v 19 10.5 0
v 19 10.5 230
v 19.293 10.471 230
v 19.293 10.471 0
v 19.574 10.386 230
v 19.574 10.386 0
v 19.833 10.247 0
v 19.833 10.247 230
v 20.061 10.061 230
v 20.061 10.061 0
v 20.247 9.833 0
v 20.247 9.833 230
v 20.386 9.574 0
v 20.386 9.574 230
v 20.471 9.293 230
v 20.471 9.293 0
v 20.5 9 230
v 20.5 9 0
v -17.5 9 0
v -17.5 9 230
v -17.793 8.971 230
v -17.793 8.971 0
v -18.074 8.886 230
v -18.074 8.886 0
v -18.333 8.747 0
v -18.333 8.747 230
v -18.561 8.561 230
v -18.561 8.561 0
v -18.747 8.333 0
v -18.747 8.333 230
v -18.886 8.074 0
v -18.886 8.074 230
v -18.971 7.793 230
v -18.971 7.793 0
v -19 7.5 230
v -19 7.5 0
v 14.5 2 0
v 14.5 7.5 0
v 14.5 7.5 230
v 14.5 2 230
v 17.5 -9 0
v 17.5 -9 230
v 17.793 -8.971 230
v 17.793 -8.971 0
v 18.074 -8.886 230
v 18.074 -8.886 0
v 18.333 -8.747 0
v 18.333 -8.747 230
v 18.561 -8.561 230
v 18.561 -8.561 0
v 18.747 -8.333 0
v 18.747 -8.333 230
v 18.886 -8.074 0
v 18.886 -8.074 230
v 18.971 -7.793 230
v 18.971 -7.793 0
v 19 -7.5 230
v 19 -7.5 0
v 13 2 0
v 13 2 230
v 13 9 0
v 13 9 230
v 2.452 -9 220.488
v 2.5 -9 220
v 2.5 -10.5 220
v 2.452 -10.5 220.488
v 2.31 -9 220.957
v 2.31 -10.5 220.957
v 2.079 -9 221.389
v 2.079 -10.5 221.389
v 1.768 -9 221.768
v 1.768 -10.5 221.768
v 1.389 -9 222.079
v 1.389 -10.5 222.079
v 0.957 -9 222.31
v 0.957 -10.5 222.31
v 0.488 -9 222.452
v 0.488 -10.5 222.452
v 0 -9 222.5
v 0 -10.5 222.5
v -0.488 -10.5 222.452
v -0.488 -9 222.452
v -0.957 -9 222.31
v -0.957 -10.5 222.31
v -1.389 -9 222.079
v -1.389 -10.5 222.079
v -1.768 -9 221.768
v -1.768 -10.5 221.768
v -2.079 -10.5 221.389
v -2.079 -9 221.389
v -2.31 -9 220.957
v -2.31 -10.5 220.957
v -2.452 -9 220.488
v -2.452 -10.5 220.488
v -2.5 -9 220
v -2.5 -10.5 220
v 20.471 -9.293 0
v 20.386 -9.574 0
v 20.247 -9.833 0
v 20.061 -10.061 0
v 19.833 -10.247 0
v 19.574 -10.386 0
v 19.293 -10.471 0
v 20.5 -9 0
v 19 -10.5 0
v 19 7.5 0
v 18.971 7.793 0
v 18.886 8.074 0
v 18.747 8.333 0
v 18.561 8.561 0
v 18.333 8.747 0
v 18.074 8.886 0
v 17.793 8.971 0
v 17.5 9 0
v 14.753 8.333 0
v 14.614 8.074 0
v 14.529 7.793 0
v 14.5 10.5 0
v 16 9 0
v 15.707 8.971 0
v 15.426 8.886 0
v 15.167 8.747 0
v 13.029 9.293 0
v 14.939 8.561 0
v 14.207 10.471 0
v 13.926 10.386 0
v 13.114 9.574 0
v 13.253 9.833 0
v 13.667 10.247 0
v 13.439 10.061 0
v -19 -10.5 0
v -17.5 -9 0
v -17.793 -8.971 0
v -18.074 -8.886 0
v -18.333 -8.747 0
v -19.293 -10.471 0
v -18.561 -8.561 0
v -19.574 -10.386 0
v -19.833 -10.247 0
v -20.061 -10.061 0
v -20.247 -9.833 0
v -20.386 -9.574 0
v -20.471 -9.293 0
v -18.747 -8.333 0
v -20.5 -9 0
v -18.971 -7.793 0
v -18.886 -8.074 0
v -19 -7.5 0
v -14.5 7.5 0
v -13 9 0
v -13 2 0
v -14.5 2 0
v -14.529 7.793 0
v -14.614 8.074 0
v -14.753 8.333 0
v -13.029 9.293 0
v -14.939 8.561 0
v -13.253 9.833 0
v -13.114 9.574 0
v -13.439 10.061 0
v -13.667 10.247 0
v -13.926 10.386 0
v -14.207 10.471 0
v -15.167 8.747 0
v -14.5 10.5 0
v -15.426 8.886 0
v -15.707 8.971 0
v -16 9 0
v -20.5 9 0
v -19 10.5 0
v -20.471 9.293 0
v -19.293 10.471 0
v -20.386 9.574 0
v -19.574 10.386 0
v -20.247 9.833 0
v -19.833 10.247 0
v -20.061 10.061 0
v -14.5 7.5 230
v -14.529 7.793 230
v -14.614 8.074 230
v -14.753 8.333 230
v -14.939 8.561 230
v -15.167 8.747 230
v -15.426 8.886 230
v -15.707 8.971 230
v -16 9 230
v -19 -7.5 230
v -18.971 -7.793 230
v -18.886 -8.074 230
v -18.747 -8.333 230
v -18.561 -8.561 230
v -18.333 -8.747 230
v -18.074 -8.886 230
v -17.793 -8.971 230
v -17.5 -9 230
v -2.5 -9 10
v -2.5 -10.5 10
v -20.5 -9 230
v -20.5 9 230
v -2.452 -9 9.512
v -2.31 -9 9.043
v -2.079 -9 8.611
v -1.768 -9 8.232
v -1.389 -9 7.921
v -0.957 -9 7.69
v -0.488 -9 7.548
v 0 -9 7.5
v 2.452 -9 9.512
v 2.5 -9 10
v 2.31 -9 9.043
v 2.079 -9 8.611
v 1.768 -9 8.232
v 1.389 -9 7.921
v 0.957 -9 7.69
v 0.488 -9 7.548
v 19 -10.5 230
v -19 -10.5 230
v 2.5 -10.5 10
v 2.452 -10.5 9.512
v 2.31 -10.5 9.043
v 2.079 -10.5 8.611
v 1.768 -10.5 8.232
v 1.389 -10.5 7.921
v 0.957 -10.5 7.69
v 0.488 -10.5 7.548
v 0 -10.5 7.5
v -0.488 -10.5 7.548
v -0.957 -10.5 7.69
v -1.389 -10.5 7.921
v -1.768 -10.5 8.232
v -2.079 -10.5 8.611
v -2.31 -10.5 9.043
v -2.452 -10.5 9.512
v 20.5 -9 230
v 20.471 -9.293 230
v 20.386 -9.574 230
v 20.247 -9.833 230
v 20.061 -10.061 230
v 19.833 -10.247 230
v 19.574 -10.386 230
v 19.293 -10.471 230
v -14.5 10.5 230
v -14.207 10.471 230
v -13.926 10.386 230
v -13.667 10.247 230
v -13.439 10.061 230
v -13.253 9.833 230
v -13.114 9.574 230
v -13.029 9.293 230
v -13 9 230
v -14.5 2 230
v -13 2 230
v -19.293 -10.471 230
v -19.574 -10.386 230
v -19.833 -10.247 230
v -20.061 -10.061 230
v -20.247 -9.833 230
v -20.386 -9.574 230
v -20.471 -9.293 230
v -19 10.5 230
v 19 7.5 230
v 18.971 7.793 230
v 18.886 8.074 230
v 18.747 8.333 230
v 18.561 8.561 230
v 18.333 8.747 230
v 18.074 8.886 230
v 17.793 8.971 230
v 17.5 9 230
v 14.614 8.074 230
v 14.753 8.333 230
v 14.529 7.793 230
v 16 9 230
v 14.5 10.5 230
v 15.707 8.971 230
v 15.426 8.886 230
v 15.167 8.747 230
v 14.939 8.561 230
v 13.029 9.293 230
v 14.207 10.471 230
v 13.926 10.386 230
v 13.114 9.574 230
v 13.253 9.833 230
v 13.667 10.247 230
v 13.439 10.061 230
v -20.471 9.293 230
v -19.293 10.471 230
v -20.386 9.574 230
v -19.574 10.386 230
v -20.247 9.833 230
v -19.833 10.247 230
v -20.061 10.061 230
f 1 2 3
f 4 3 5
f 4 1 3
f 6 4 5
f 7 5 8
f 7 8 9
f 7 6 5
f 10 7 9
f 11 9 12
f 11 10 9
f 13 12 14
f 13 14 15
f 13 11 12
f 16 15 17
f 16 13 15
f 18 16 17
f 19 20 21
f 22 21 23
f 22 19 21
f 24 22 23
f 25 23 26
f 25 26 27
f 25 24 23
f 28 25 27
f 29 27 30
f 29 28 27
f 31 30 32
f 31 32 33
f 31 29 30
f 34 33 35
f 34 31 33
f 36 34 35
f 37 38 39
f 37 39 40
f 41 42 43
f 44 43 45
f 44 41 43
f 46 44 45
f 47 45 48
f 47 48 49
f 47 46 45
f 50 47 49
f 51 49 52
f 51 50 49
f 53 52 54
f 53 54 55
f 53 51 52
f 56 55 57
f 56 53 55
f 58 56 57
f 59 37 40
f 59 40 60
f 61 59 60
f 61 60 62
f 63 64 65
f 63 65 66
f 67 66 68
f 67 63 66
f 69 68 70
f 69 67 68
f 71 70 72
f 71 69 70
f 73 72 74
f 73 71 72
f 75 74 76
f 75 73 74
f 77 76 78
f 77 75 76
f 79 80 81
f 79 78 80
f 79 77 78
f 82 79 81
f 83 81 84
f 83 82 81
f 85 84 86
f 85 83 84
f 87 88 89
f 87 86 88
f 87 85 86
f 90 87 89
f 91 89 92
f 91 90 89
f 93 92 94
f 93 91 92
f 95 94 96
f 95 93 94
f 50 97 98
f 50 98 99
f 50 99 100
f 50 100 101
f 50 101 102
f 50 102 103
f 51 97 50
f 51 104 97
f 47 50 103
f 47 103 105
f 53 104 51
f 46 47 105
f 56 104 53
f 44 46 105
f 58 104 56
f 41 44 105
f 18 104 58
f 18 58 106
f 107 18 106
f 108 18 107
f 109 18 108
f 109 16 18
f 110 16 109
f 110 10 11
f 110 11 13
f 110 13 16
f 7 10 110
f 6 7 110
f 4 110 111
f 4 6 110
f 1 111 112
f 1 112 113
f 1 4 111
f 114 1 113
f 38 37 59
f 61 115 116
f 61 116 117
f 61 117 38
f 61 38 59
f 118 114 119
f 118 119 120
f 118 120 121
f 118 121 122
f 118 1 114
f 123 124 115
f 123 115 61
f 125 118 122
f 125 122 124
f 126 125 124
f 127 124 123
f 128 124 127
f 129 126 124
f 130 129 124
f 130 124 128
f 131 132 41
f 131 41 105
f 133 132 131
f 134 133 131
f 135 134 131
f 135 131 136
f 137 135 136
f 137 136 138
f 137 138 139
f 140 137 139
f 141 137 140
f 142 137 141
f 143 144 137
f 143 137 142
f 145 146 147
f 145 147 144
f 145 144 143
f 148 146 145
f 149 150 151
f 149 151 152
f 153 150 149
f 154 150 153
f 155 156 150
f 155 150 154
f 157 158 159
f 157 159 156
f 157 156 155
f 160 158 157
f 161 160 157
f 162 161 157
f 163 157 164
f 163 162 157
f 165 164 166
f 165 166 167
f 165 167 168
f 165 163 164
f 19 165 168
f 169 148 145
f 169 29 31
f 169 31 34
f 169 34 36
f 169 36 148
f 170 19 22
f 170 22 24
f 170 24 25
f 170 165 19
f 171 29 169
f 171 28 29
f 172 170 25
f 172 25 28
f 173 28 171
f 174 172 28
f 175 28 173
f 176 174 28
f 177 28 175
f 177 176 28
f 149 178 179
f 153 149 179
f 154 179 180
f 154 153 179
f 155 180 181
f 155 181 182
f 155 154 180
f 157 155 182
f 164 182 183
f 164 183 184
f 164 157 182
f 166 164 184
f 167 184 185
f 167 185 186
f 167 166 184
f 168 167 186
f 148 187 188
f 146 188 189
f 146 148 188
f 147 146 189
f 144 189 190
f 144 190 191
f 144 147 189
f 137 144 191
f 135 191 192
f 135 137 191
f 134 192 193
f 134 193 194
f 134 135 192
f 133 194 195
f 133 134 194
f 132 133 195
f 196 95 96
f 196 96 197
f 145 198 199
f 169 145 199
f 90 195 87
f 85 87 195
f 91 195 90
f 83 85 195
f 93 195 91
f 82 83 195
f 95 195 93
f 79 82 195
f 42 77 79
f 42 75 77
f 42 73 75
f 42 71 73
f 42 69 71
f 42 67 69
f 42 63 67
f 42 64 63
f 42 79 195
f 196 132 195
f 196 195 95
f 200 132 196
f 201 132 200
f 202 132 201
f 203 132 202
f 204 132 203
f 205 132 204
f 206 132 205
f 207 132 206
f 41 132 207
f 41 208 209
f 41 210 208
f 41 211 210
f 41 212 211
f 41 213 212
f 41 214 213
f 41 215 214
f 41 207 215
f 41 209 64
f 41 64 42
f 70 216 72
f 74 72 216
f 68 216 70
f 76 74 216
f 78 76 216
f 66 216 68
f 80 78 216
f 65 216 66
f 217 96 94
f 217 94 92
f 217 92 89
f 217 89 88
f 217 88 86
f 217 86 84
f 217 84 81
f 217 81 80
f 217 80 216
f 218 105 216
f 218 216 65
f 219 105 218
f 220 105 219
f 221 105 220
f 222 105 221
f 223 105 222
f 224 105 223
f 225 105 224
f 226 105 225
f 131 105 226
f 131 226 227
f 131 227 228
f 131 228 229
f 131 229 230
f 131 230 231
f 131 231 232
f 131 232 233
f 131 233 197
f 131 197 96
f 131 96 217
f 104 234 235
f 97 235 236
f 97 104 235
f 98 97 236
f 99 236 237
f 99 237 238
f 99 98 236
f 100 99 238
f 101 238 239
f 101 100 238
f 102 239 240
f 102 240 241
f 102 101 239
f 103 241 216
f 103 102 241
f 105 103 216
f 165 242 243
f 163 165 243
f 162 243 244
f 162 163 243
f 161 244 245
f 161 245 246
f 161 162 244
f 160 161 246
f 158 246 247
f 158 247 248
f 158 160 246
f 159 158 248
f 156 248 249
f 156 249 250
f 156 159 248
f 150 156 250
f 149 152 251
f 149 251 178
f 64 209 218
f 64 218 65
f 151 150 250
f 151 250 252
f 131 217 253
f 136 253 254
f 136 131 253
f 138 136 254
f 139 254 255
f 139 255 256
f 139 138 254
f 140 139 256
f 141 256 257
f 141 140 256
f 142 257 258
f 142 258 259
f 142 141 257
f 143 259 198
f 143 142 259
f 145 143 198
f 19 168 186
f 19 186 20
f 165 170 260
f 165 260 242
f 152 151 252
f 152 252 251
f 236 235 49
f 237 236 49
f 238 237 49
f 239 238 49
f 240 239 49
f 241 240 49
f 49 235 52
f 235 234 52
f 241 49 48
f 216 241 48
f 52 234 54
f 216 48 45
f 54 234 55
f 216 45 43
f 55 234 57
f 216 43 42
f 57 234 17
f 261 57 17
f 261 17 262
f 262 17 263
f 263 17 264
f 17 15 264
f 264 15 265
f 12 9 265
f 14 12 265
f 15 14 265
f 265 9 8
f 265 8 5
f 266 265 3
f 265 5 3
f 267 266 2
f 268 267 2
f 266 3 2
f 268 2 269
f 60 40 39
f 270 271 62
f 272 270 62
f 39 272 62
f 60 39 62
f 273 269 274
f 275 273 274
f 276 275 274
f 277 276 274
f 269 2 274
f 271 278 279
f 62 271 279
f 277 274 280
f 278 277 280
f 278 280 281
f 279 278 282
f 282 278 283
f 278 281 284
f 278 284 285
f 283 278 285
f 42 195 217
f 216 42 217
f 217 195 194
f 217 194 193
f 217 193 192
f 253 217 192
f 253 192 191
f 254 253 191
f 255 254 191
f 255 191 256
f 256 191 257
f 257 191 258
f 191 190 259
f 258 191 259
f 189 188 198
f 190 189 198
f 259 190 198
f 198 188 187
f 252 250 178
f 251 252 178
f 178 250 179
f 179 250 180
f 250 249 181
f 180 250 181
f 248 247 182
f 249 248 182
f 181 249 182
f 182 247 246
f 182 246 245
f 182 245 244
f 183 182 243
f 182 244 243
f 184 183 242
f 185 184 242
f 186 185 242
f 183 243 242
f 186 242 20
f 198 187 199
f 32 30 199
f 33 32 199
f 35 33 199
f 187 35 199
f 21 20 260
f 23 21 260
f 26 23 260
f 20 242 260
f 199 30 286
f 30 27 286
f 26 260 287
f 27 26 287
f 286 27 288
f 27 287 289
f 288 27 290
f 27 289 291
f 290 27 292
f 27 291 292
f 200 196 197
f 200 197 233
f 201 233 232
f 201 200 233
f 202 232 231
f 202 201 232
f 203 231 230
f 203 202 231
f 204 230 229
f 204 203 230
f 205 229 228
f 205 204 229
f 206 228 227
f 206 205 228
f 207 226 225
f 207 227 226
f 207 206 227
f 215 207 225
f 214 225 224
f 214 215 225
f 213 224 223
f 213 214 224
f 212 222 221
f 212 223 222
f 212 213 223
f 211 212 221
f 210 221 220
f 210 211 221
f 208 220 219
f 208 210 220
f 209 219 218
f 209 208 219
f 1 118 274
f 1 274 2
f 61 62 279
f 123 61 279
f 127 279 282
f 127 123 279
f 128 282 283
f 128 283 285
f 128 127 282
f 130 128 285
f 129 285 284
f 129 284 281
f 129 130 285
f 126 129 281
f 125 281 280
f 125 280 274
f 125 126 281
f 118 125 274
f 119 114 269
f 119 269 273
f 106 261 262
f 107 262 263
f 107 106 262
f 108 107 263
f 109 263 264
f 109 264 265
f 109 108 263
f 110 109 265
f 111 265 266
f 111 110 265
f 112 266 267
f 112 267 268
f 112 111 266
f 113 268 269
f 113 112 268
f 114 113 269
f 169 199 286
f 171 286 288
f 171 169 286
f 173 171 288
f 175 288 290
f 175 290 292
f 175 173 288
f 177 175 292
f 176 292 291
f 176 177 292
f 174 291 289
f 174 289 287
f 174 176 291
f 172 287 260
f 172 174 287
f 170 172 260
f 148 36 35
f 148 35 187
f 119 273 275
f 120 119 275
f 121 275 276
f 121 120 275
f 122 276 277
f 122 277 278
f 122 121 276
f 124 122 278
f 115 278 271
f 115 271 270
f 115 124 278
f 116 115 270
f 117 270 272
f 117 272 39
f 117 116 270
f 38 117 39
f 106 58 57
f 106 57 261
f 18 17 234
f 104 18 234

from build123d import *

# Parameters (mm, degrees)
EXTRUDE_1_DEPTH     = 230
CUT_EXTRUDE_1_DEPTH = 100


with BuildPart() as part:
    # 草图1 → 凸台-拉伸1 (new body)
    with BuildSketch(Plane.XY):
        with BuildLine():
            Line((-19, 10.5), (-14.5, 10.5))
            ThreePointArc((-14.5, 10.5), (-13.439339828, 10.060660172), (-13, 9))
            Line((-13, 9), (-13, 2))
            Line((-13, 2), (-14.5, 2))
            Line((-14.5, 2), (-14.5, 7.5))
            ThreePointArc((-14.5, 7.5), (-14.939339828, 8.560660172), (-16, 9))
            Line((-16, 9), (-17.5, 9))
            ThreePointArc((-17.5, 9), (-18.560660172, 8.560660172), (-19, 7.5))
            Line((-19, 7.5), (-19, -7.5))
            ThreePointArc((-19, -7.5), (-18.560660172, -8.560660172), (-17.5, -9))
            Line((-17.5, -9), (17.5, -9))
            ThreePointArc((17.5, -9), (18.560660172, -8.560660172), (19, -7.5))
            Line((19, -7.5), (19, 7.5))
            ThreePointArc((19, 7.5), (18.560660172, 8.560660172), (17.5, 9))
            Line((17.5, 9), (16, 9))
            ThreePointArc((16, 9), (14.939339828, 8.560660172), (14.5, 7.5))
            Line((14.5, 7.5), (14.5, 2))
            Line((14.5, 2), (13, 2))
            Line((13, 2), (13, 9))
            ThreePointArc((13, 9), (13.439339828, 10.060660172), (14.5, 10.5))
            Line((14.5, 10.5), (19, 10.5))
            ThreePointArc((19, 10.5), (20.060660172, 10.060660172), (20.5, 9))
            Line((20.5, 9), (20.5, -9))
            ThreePointArc((20.5, -9), (20.060660172, -10.060660172), (19, -10.5))
            Line((19, -10.5), (-19, -10.5))
            ThreePointArc((-19, -10.5), (-20.060660172, -10.060660172), (-20.5, -9))
            Line((-20.5, -9), (-20.5, 9))
            ThreePointArc((-20.5, 9), (-20.060660172, 10.060660172), (-19, 10.5))
        make_face()
    extrude(amount=EXTRUDE_1_DEPTH)

    # 草图3 → 切除-拉伸1 (cut)
    with BuildSketch(Plane(origin=(0, 0, 0), x_dir=(1, 0, 0), z_dir=(0, 1, 0))):
        with BuildLine():
            Line((2.5, -10), (2.5, -220))
            ThreePointArc((2.5, -220), (0, -222.5), (-2.5, -220))
            Line((-2.5, -220), (-2.5, -10))
            ThreePointArc((-2.5, -10), (0, -7.5), (2.5, -10))
        make_face()
    extrude(amount=-CUT_EXTRUDE_1_DEPTH, mode=Mode.SUBTRACT)


solid = part.part
